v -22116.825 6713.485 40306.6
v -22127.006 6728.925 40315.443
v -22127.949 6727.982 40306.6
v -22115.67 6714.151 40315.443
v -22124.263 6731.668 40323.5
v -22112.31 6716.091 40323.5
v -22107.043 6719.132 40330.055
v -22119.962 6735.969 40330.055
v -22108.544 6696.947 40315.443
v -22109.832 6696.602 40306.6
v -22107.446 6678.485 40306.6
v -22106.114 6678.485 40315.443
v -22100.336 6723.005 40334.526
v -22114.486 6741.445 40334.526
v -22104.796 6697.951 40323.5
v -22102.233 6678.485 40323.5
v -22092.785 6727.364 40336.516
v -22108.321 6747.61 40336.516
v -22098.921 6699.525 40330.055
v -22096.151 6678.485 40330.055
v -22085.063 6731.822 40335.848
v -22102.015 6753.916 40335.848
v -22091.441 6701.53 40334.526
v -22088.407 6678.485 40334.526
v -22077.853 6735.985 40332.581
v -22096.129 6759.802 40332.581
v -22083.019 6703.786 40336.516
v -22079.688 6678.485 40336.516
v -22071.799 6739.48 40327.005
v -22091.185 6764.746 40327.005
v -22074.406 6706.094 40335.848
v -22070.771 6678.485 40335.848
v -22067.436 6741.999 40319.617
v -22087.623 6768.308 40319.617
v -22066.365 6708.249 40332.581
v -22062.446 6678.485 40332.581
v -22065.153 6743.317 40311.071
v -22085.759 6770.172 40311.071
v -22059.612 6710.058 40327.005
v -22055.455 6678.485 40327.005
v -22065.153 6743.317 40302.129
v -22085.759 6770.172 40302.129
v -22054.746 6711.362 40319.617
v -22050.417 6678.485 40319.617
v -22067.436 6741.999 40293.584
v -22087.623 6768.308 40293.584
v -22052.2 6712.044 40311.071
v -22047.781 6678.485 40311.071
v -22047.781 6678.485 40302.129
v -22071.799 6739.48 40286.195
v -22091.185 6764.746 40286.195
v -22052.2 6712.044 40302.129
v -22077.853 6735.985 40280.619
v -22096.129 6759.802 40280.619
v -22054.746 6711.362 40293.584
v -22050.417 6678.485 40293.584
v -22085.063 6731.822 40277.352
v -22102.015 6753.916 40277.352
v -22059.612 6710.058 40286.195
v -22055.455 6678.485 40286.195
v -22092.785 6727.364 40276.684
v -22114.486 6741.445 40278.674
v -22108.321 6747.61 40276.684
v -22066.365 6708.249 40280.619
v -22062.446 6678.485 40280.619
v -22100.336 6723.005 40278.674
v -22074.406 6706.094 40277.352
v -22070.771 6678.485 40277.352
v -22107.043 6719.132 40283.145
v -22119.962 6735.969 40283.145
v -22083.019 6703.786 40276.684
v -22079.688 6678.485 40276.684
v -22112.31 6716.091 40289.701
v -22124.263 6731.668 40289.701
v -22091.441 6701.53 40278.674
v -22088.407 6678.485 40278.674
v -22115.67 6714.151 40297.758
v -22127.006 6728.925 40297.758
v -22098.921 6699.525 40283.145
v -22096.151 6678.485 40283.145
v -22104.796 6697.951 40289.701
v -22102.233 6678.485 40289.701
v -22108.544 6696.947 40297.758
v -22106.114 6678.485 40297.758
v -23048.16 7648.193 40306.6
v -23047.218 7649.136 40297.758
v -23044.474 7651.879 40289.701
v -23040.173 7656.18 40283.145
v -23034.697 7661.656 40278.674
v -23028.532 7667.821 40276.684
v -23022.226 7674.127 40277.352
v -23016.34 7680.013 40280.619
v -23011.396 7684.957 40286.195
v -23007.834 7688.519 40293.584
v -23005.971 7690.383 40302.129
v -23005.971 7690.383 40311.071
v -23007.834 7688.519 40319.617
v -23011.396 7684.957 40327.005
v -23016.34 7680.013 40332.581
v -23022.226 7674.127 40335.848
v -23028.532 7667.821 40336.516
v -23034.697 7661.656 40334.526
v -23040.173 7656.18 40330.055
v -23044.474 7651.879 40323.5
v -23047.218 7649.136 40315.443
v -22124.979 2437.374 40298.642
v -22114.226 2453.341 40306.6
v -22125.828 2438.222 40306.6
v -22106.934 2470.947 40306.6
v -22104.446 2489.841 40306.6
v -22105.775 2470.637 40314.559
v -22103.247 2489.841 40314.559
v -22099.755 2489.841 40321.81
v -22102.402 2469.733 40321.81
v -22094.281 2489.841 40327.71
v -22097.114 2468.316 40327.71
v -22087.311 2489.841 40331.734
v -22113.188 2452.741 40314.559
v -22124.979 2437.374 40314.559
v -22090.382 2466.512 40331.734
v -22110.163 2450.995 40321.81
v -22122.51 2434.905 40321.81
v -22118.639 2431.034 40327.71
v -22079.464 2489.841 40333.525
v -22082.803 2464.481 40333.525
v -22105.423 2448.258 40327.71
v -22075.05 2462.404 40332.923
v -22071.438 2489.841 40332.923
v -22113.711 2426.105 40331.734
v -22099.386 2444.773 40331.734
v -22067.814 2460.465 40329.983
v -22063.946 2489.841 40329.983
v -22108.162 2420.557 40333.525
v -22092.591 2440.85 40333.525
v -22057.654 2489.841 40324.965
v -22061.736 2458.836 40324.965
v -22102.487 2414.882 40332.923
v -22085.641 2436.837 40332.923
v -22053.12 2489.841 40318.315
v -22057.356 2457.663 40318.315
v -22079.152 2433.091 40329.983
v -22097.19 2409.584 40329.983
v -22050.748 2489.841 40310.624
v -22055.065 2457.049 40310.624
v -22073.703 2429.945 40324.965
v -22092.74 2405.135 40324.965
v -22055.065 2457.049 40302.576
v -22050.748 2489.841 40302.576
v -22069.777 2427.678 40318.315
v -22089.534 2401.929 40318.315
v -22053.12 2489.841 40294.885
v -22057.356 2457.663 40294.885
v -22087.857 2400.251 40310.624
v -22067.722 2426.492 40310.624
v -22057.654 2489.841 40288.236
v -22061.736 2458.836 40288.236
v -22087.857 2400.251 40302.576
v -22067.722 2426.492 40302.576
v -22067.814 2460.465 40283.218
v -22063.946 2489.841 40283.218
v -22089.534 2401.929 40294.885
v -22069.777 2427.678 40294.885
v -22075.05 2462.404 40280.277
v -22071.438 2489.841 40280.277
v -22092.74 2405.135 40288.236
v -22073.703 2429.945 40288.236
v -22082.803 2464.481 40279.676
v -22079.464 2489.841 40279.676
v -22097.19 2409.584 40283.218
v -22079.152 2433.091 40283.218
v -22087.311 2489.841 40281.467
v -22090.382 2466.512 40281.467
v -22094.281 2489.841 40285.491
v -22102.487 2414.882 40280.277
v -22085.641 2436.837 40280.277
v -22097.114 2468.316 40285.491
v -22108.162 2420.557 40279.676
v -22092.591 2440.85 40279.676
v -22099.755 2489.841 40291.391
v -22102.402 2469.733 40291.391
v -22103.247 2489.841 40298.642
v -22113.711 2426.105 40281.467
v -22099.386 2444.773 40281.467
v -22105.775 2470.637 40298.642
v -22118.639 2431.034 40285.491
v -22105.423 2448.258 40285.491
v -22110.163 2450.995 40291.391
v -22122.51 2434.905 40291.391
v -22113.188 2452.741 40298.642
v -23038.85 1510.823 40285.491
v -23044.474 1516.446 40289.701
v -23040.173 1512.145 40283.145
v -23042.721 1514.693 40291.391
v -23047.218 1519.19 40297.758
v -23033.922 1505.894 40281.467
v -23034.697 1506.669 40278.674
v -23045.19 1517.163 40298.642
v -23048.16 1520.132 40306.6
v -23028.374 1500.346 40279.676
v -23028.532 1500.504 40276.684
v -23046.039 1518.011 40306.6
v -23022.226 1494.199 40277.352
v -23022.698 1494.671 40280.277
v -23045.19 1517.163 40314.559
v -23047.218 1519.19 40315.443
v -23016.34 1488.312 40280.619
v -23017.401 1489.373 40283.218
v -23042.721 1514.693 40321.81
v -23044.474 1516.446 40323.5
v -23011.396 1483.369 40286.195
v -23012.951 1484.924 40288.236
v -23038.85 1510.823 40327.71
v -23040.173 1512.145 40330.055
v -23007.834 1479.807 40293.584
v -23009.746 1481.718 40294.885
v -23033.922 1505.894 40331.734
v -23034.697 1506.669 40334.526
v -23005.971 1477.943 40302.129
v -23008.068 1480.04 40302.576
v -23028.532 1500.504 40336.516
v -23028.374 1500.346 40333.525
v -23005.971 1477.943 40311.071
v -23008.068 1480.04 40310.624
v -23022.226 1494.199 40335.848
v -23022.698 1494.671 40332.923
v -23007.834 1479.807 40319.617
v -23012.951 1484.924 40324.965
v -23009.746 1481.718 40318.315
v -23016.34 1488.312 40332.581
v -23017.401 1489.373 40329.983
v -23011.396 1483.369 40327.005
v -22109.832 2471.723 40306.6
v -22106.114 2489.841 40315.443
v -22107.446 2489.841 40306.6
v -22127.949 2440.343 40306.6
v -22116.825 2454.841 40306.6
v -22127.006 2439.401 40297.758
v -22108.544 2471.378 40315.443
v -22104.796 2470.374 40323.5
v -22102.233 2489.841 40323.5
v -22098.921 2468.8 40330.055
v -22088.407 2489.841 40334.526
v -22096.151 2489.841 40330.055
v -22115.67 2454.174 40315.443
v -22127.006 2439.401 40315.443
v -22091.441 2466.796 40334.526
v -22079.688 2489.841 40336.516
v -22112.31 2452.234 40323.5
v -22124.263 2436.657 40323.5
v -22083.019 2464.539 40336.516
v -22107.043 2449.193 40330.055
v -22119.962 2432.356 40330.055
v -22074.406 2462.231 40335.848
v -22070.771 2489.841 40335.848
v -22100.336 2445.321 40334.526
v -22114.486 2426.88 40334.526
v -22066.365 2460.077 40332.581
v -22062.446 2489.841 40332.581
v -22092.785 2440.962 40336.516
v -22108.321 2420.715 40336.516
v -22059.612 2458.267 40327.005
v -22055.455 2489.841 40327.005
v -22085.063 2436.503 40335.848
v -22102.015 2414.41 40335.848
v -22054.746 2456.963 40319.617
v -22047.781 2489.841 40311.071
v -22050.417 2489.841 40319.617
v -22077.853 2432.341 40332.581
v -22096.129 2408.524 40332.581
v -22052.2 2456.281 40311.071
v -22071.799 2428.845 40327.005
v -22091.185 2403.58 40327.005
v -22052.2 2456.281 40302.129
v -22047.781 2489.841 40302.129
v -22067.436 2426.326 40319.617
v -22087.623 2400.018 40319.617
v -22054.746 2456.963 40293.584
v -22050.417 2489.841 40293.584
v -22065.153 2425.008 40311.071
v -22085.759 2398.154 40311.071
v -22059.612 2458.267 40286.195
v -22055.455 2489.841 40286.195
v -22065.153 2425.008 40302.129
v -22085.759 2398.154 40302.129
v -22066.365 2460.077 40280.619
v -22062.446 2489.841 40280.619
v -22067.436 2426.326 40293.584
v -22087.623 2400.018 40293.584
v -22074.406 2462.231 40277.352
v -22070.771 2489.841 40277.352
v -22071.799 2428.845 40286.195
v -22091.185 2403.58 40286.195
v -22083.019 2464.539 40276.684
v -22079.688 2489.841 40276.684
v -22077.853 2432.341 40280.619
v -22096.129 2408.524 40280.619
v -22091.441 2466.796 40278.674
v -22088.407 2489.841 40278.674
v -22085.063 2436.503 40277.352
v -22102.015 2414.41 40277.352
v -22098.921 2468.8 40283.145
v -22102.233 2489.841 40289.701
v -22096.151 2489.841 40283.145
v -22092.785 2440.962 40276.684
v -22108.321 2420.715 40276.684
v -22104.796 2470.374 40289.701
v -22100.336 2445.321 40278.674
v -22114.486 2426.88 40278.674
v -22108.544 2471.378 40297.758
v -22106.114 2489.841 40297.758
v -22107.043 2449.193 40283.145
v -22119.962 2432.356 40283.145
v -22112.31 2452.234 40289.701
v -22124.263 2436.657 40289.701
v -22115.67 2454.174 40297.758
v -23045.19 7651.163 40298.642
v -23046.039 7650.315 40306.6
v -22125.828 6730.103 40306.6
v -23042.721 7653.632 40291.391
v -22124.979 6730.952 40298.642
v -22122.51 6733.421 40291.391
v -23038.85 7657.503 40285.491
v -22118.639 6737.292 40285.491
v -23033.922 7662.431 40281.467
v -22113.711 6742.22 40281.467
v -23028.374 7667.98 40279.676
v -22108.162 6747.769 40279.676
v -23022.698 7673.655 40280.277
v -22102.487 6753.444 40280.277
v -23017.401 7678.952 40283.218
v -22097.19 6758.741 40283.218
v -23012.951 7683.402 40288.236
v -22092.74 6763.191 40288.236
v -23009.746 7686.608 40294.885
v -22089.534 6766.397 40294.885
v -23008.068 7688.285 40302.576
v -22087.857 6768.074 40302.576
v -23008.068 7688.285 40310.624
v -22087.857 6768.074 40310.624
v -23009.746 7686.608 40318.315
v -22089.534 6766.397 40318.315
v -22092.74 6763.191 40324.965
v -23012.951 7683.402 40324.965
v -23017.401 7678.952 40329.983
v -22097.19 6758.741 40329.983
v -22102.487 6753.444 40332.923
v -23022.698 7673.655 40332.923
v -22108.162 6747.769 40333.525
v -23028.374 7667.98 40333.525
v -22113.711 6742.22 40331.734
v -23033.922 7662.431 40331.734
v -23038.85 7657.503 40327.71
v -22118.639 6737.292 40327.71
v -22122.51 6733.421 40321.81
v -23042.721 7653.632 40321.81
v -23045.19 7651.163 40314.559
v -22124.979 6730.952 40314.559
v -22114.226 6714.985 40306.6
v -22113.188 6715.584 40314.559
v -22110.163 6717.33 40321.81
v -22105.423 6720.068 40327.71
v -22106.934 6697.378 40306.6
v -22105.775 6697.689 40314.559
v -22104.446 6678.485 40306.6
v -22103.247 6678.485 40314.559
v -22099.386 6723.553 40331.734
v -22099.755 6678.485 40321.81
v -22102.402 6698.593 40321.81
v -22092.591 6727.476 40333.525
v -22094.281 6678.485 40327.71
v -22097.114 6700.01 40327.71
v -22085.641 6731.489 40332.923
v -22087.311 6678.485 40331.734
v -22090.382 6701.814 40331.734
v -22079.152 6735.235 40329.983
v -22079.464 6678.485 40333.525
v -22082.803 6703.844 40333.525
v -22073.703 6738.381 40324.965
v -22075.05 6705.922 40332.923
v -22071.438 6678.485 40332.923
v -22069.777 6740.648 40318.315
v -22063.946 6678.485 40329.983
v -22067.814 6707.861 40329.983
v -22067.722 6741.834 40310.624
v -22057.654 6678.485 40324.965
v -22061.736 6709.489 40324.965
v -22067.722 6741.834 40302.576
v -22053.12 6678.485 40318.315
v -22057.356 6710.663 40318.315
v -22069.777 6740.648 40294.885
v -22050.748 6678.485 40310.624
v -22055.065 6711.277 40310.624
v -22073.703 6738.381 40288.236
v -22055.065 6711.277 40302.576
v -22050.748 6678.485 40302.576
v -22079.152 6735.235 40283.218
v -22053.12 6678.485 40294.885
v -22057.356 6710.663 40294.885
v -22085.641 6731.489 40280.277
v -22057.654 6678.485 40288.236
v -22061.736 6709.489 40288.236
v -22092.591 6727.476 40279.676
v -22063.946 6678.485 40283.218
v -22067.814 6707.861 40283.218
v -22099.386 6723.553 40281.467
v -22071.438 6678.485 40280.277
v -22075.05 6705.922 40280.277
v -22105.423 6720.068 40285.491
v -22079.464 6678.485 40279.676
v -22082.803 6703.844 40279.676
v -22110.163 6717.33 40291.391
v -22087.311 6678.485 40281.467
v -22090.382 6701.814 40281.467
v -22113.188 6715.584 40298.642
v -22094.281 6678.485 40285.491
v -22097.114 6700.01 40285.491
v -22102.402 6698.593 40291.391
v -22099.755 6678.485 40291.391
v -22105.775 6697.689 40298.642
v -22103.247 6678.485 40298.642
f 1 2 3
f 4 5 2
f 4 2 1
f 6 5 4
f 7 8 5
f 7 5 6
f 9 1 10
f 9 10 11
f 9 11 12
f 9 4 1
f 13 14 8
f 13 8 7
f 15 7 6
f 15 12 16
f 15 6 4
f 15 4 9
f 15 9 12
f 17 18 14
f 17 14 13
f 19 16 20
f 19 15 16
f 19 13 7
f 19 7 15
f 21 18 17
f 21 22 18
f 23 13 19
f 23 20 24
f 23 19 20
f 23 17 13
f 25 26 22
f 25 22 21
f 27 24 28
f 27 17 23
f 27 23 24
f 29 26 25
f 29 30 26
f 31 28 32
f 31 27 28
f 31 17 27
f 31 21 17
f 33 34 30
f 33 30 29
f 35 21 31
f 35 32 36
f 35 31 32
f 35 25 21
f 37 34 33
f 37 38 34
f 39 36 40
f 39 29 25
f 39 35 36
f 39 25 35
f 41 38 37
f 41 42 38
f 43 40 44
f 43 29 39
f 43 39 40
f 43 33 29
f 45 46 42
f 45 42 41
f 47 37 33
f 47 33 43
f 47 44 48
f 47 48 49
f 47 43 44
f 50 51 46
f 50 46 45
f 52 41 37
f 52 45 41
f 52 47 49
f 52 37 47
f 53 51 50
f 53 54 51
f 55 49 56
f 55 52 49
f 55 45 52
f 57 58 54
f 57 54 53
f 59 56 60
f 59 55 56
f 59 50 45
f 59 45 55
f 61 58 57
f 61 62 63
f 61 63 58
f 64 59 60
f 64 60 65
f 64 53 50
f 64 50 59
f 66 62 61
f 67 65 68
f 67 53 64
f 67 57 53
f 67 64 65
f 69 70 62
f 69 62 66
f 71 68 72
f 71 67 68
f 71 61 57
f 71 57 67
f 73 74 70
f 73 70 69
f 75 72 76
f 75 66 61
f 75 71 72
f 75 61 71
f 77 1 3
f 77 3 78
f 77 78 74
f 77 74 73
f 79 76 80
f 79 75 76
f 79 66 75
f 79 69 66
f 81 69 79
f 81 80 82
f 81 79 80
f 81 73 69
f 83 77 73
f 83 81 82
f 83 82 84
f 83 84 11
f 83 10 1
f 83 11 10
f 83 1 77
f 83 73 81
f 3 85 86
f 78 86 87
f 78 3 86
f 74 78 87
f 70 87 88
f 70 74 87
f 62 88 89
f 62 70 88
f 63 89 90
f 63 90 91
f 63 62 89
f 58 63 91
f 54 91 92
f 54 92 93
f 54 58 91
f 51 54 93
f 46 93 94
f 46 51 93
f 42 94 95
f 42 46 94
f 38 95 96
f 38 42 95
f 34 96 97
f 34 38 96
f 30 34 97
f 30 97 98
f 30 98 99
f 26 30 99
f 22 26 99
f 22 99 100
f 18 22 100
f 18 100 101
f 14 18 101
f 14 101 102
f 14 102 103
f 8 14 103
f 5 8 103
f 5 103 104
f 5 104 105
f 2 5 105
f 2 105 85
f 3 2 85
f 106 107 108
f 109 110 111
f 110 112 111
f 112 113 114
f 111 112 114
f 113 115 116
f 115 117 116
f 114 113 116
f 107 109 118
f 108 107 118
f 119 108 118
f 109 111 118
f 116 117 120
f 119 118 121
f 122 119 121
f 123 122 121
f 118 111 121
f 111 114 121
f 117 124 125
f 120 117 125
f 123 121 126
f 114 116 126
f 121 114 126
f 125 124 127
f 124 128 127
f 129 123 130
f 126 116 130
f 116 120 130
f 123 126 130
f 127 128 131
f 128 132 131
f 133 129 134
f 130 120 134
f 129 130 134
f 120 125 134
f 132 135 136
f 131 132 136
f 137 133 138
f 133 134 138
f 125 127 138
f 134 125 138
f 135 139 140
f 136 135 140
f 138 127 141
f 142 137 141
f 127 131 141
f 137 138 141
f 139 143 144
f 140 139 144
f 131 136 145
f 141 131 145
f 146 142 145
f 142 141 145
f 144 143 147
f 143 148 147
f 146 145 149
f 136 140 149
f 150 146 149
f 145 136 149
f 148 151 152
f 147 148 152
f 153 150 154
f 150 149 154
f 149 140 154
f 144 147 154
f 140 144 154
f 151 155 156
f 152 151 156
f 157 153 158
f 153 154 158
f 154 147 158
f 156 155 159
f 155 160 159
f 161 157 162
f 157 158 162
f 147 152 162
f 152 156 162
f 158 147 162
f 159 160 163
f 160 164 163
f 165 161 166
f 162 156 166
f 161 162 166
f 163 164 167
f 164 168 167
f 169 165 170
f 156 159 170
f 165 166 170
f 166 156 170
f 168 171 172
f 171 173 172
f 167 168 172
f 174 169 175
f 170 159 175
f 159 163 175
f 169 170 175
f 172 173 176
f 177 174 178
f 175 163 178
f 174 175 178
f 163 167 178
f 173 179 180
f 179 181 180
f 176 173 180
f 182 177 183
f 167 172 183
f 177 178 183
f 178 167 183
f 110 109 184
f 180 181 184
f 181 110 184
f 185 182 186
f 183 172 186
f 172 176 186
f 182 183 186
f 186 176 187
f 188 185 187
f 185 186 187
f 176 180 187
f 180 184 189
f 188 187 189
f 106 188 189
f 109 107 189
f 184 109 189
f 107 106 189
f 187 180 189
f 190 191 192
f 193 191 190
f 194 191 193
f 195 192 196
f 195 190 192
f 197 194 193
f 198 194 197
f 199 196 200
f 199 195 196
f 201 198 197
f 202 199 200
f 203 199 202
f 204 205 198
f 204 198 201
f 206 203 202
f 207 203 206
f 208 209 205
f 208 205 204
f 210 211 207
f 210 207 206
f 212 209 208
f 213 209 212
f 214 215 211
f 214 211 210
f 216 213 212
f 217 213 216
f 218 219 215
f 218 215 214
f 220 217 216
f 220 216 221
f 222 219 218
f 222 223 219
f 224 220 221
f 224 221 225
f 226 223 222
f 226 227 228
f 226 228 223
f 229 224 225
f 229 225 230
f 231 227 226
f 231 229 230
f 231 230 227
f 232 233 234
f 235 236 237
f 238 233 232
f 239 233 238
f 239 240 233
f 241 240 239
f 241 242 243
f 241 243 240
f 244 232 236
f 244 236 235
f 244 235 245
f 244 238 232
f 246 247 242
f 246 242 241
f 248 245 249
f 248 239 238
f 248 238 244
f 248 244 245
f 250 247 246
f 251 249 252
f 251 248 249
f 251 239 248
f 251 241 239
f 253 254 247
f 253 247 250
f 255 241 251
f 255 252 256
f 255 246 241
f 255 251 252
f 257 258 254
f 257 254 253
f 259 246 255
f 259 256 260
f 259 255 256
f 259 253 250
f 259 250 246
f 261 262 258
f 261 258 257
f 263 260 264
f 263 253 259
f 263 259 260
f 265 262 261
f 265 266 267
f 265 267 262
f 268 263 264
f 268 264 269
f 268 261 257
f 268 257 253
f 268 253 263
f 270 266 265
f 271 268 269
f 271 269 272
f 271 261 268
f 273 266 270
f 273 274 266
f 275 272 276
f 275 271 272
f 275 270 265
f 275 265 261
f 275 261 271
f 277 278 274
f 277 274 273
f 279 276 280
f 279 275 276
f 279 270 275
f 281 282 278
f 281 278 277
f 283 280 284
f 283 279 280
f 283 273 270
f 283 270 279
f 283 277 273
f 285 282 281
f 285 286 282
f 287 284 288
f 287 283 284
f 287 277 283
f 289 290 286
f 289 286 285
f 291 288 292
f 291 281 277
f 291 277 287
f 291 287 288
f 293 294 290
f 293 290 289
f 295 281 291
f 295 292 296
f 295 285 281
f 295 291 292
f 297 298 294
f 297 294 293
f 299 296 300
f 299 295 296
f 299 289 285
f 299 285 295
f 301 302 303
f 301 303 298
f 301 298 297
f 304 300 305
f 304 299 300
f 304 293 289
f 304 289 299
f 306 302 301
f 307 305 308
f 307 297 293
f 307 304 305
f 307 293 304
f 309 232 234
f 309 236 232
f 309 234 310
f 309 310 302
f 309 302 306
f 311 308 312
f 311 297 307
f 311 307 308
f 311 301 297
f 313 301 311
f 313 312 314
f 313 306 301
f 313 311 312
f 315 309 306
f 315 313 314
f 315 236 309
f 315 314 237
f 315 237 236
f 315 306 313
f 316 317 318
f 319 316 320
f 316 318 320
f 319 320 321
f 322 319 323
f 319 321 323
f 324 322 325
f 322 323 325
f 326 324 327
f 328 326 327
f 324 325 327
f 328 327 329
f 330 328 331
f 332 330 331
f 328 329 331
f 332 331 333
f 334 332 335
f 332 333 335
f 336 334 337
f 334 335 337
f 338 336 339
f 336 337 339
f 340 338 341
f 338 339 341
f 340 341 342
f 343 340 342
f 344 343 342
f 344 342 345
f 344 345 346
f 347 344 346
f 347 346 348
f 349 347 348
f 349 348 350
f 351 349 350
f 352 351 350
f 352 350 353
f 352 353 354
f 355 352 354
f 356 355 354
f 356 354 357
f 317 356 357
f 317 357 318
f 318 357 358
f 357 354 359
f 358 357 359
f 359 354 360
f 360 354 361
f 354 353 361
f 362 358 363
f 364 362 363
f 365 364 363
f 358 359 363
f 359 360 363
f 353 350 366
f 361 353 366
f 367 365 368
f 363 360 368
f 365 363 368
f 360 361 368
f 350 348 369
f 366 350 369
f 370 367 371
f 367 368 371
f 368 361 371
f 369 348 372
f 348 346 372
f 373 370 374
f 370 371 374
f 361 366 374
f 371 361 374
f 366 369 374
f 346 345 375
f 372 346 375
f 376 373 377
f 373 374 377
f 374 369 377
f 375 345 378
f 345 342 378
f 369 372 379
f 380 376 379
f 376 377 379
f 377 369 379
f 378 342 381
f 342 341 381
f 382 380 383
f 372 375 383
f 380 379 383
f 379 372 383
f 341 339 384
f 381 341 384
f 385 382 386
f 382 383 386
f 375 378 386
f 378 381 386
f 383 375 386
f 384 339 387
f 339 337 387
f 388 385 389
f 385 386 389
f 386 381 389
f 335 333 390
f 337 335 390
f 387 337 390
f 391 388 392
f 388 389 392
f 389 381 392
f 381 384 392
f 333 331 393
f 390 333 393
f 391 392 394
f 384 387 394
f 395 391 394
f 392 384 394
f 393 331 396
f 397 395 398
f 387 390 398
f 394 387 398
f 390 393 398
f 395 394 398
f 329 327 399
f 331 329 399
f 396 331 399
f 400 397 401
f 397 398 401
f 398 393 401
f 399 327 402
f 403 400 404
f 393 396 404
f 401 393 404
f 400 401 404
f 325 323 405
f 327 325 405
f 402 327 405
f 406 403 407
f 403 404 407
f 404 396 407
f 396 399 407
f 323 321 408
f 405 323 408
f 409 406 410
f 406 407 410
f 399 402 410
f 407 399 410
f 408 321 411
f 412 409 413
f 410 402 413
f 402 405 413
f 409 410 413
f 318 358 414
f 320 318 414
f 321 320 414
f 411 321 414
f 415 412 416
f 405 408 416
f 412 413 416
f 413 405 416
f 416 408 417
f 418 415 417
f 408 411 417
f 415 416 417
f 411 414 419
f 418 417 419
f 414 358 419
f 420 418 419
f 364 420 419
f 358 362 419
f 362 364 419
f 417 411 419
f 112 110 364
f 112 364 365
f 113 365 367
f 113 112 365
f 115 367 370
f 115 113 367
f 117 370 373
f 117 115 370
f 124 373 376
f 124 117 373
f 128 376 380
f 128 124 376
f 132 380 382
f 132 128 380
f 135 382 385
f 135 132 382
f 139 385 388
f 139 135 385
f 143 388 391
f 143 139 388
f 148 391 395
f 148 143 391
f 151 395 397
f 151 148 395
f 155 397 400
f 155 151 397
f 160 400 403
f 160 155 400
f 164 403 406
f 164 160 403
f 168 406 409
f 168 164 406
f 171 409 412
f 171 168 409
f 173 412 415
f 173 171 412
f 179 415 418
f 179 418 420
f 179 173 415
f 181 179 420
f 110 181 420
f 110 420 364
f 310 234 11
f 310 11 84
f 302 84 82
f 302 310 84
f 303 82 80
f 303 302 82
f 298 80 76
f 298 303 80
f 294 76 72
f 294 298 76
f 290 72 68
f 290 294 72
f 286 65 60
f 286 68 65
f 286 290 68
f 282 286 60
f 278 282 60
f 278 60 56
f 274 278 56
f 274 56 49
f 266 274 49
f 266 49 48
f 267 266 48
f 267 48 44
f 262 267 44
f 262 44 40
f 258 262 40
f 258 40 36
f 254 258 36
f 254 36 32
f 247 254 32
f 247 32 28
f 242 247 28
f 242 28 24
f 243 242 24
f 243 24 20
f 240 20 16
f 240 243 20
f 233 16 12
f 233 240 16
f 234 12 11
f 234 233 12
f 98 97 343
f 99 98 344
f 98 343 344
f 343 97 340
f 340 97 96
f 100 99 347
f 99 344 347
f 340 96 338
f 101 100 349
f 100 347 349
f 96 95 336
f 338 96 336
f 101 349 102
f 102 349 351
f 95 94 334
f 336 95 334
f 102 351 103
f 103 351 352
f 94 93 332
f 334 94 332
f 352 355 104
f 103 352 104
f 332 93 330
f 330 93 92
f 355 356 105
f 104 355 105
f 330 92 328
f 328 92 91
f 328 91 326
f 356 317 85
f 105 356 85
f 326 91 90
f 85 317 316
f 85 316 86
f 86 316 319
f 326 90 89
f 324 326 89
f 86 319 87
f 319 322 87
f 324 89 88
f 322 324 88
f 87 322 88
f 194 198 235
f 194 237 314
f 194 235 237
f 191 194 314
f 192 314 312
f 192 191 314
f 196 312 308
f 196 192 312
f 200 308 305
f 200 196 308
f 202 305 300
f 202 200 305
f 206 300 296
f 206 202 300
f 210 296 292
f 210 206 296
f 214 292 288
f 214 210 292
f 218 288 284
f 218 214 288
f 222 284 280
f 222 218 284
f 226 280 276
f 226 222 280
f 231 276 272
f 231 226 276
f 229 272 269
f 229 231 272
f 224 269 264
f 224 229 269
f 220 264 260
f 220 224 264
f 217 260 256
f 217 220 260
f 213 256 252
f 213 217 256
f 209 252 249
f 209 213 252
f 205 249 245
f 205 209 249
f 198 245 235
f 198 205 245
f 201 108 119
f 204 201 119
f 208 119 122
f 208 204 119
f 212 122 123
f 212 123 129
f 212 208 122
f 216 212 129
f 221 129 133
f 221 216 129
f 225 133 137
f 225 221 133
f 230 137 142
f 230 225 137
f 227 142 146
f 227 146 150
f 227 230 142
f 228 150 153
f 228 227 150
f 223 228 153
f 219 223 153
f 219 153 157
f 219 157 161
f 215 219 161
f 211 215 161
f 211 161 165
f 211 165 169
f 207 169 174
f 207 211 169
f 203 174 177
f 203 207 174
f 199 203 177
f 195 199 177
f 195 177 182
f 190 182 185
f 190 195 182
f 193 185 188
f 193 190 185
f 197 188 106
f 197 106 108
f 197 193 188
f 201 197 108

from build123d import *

# Parameters (mm, degrees)
SWEEP_THIN1_PROFILE_R   = 30
SWEEP_THIN1_PROFILE_R_2 = 27


with BuildPart() as part:
    # Sweep-Thin1: sweep along a curve in space
    with BuildLine() as sweep_thin1_path:
        Line((-23026.9467766, 7669.406483062, 40306.600196068), (-22106.735652782, 6749.195359243, 40306.600196068))
        ThreePointArc((-22106.735652782, 6749.195359243, 40306.600196068), (-22085.058377649, 6716.753024361, 40306.600196068), (-22077.4463309, 6678.484681125, 40306.600196068))
        Line((-22077.4463309, 6678.484681125, 40306.600196068), (-22077.4463309, 2489.840786919, 40306.600196068))
        ThreePointArc((-22077.4463309, 2489.840786919, 40306.600196068), (-22085.058377649, 2451.572443682, 40306.600196068), (-22106.735652782, 2419.1301088, 40306.600196068))
        Line((-22106.735652782, 2419.1301088, 40306.600196068), (-23026.9467766, 1498.918984982, 40306.600196068))
    # Sweep-Thin1 profile (on start of the path) → Sweep-Thin1 (sweep)
    with BuildSketch(Plane(origin=(-23026.9467766, 7669.406483062, 40306.600196068), x_dir=(-0.7071067811865492, -0.7071067811865458, 0), z_dir=(0.7071067811865458, -0.7071067811865492, 0))):
        Circle(SWEEP_THIN1_PROFILE_R)
        Circle(SWEEP_THIN1_PROFILE_R_2, mode=Mode.SUBTRACT)
    sweep(path=sweep_thin1_path.line)


solid = part.part
